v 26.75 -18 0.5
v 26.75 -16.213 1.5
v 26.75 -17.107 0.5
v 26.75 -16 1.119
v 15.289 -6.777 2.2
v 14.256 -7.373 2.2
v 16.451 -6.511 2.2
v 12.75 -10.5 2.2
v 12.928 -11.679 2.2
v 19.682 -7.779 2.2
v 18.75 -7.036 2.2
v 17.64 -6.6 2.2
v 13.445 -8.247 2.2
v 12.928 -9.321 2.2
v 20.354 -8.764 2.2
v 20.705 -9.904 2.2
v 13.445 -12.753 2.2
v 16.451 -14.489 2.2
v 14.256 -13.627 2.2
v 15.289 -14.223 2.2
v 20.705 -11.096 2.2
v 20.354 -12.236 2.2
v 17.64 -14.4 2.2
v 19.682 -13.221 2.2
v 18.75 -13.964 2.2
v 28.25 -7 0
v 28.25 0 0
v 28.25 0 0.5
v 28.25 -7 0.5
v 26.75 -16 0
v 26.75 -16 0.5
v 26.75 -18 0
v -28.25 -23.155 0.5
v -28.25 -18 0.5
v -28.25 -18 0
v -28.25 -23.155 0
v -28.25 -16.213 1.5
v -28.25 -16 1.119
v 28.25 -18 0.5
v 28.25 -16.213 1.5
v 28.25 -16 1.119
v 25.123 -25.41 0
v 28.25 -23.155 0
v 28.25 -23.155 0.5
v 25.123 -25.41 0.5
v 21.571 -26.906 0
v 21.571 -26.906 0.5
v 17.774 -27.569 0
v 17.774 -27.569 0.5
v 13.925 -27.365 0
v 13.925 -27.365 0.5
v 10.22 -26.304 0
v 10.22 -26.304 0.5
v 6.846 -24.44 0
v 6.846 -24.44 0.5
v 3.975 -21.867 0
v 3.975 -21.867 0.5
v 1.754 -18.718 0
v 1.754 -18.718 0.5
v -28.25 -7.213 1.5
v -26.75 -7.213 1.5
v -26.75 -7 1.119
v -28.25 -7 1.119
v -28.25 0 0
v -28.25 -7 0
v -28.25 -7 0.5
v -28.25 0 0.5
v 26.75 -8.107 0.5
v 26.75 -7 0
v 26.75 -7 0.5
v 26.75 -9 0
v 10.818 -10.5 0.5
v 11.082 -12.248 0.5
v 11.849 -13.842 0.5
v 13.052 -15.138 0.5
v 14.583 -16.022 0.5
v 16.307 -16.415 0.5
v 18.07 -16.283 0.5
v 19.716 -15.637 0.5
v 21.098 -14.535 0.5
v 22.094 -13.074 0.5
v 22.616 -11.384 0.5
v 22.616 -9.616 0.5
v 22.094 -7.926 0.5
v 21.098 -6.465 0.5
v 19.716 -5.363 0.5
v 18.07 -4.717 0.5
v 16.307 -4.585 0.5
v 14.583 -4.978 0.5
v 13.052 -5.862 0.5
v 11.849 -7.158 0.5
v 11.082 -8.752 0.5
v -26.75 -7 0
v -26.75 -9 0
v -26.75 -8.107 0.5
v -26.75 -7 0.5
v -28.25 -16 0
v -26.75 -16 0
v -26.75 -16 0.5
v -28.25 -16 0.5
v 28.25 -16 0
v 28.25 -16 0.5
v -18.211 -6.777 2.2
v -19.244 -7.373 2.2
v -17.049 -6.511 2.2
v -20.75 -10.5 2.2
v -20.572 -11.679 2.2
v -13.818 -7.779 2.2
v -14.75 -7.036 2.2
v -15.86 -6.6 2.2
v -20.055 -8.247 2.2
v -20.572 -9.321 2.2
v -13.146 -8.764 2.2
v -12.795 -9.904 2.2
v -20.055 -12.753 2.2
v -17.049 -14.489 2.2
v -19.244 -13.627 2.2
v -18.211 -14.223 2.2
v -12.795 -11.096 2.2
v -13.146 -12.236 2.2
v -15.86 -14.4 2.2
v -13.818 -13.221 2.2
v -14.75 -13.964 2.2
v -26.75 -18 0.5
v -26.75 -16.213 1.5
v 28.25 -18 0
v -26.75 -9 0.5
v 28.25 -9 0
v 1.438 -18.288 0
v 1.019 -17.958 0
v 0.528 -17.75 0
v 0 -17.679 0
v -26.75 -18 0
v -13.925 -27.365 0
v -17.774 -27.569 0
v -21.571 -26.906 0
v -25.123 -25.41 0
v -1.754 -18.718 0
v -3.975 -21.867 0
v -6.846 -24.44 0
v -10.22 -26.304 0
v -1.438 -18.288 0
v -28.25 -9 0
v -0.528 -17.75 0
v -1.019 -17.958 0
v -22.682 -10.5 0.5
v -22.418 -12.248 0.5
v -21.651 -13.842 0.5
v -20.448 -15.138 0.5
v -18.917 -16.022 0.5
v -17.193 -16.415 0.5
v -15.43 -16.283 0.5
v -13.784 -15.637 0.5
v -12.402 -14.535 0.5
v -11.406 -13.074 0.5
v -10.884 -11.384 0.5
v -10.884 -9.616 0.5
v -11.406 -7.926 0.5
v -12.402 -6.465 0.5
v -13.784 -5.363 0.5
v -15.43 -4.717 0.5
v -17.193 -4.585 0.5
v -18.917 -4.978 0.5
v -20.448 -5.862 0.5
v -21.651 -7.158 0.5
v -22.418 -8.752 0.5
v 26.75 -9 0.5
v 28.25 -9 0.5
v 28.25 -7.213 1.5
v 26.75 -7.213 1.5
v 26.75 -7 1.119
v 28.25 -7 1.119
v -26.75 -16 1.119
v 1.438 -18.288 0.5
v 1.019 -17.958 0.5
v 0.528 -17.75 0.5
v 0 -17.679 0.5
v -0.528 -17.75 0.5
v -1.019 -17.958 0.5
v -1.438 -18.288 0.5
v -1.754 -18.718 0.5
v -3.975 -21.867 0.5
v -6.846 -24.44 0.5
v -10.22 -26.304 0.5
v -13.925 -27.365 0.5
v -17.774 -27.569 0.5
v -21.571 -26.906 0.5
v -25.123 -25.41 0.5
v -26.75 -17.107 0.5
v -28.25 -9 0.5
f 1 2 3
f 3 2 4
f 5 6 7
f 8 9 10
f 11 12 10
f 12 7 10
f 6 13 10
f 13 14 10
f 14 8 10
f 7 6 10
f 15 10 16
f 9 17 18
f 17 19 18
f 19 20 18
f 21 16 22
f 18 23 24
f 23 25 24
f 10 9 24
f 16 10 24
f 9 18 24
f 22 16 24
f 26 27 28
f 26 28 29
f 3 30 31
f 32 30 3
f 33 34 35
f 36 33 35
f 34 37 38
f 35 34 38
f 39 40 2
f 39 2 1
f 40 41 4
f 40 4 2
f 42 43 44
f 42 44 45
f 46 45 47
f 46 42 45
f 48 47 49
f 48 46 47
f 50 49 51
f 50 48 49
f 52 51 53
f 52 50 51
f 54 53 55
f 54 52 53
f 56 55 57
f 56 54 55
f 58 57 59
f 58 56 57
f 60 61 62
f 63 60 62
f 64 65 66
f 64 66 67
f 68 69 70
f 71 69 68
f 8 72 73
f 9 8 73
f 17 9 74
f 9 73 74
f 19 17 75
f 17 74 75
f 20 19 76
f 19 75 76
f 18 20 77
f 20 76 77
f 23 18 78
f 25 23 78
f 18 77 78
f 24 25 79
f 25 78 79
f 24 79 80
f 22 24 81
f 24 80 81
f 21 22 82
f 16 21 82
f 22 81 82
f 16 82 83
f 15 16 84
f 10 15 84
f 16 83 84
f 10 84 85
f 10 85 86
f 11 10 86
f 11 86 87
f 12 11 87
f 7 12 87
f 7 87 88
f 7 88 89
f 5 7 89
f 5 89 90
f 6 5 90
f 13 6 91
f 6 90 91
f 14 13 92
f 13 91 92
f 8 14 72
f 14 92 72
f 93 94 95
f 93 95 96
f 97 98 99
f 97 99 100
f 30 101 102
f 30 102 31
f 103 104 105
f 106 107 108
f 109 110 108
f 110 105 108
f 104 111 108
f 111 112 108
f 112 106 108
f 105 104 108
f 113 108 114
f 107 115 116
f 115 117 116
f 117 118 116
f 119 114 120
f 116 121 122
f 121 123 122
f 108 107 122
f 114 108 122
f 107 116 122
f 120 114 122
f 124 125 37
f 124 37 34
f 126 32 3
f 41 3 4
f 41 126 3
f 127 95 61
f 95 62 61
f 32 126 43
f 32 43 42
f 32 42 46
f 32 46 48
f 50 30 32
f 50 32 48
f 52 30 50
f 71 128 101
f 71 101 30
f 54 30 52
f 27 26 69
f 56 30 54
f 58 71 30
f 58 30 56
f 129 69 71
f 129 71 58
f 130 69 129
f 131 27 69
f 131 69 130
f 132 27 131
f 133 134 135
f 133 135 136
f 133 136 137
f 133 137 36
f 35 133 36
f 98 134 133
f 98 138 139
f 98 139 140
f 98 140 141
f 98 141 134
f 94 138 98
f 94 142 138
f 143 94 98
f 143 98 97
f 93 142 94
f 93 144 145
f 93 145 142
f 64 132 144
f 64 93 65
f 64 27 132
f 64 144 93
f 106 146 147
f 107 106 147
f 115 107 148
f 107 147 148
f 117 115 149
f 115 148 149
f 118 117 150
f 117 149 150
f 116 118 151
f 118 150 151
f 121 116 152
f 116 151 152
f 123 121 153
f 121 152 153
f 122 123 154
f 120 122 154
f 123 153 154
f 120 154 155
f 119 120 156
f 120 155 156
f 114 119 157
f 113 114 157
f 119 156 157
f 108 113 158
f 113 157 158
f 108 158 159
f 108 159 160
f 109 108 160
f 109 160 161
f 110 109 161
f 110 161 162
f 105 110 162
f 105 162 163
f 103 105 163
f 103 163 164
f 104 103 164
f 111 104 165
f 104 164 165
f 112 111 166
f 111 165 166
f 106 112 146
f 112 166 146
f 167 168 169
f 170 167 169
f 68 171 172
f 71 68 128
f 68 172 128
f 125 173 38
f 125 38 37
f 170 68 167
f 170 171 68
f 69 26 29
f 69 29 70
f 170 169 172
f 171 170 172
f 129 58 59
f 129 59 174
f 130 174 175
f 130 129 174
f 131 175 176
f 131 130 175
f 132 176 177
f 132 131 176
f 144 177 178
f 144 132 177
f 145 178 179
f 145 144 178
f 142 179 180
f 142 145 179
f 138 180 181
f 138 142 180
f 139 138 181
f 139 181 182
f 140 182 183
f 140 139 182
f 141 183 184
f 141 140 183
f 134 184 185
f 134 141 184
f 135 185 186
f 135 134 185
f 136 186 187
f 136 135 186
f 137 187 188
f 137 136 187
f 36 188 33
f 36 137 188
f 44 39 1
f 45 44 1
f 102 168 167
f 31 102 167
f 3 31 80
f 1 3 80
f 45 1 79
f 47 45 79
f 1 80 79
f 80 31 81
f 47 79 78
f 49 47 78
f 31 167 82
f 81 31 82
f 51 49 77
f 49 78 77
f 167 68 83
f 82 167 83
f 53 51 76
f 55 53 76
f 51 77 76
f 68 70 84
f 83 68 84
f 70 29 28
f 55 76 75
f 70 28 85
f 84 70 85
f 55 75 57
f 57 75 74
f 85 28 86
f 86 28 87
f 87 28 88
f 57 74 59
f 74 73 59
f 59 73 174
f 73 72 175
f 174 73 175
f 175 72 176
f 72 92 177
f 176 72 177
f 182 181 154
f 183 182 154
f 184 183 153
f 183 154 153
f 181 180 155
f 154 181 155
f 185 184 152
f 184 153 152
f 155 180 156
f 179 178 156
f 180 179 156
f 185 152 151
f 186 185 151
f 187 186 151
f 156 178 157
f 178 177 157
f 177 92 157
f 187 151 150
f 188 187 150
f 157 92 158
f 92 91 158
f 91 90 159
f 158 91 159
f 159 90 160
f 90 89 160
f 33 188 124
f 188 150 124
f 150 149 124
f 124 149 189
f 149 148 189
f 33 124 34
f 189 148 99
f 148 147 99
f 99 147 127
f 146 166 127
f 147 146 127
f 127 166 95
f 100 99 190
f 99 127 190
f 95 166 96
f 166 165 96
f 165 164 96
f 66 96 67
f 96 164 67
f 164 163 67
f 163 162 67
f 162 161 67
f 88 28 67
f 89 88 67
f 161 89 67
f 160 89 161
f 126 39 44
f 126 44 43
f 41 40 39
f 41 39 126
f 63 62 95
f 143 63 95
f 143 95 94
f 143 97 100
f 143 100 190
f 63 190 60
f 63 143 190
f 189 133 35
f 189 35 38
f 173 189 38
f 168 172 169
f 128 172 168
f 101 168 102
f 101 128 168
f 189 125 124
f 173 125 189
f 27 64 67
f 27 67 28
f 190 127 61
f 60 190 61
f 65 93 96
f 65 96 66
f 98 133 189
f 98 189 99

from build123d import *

# Parameters (mm, degrees)
BOSS_EXTRU_1_DEPTH = 0.5
BOSS_EXTRU_2_DEPTH = 1.5
BOSS_EXTRU_3_START = -55
BOSS_EXTRU_3_DEPTH = 1.5


with BuildPart() as part:
    # Esquisse1 → Boss.-Extru.1 (new body)
    with BuildSketch(Plane.XY):
        with BuildLine():
            Line((-28.25, 0), (28.25, 0))
            Line((28.25, 0), (28.25, -7))
            Line((28.25, -7), (26.75, -7))
            Line((26.75, -7), (26.75, -9))
            Line((26.75, -9), (28.25, -9))
            Line((28.25, -9), (28.25, -16))
            Line((28.25, -16), (26.75, -16))
            Line((26.75, -16), (26.75, -18))
            Line((26.75, -18), (28.25, -18))
            Line((28.25, -18), (28.25, -23.155433616))
            ThreePointArc((28.25, -23.155433616), (13.925220168, -27.365070972), (1.753926702, -18.717529168))
            ThreePointArc((1.753926702, -18.717529168), (0, -17.678643691), (-1.753926702, -18.717529168))
            ThreePointArc((-1.753926702, -18.717529168), (-13.925220168, -27.365070972), (-28.25, -23.155433616))
            Line((-28.25, -23.155433616), (-28.25, -18))
            Line((-28.25, -18), (-26.75, -18))
            Line((-26.75, -18), (-26.75, -16))
            Line((-26.75, -16), (-28.25, -16))
            Line((-28.25, -16), (-28.25, -9))
            Line((-28.25, -9), (-26.75, -9))
            Line((-26.75, -9), (-26.75, -7))
            Line((-26.75, -7), (-28.25, -7))
            Line((-28.25, -7), (-28.25, 0))
        make_face()
    extrude(amount=BOSS_EXTRU_1_DEPTH)

    # Esquisse2 → Révolution1 (revolve)
    with BuildSketch(Plane.XZ.offset(10.5), mode=Mode.PRIVATE) as r_volution1_sk:
        Polygon((-16.75, 0), (-16.75, 2.2), (-12.75, 2.2), (-10.25, 0), align=None)
    revolve(r_volution1_sk.sketch.rotate(Axis((-16.75, -10.5, 0), (0, 0, 1)), 180), axis=Axis((-16.75, -10.5, 0), (0, 0, 1)))

    # Esquisse3 → Révolution2 (revolve)
    with BuildSketch(Plane.XZ.offset(10.5), mode=Mode.PRIVATE) as r_volution2_sk:
        Polygon((16.75, 0), (16.75, 2.2), (20.75, 2.2), (23.25, 0), align=None)
    revolve(r_volution2_sk.sketch.rotate(Axis((16.75, -10.5, 0), (0, 0, 1)), 180), axis=Axis((16.75, -10.5, 0), (0, 0, 1)))

    # Esquisse5 → Boss.-Extru.2 (add)
    with BuildSketch(Plane(origin=(28.25, 0, 0), x_dir=(0, 0, -1), z_dir=(1, 0, 0))):
        Polygon((0, -18), (-1.119243945, -16), (-1.5, -16.213079455), (-0.5, -18), align=None)
        Polygon((-0.5, -9), (-1.5, -7.213079455), (-1.119243945, -7), (0, -9), align=None)
    extrude(amount=-BOSS_EXTRU_2_DEPTH)

    # Esquisse5<2> → Boss.-Extru.3 (add)
    with BuildSketch(Plane(origin=(28.25, 0, 0), x_dir=(0, 0, -1), z_dir=(1, 0, 0)).offset(BOSS_EXTRU_3_START)):
        Polygon((0, -18), (-1.119243945, -16), (-1.5, -16.213079455), (-0.5, -18), align=None)
        Polygon((-0.5, -9), (-1.5, -7.213079455), (-1.119243945, -7), (0, -9), align=None)
    extrude(amount=-BOSS_EXTRU_3_DEPTH)


solid = part.part
